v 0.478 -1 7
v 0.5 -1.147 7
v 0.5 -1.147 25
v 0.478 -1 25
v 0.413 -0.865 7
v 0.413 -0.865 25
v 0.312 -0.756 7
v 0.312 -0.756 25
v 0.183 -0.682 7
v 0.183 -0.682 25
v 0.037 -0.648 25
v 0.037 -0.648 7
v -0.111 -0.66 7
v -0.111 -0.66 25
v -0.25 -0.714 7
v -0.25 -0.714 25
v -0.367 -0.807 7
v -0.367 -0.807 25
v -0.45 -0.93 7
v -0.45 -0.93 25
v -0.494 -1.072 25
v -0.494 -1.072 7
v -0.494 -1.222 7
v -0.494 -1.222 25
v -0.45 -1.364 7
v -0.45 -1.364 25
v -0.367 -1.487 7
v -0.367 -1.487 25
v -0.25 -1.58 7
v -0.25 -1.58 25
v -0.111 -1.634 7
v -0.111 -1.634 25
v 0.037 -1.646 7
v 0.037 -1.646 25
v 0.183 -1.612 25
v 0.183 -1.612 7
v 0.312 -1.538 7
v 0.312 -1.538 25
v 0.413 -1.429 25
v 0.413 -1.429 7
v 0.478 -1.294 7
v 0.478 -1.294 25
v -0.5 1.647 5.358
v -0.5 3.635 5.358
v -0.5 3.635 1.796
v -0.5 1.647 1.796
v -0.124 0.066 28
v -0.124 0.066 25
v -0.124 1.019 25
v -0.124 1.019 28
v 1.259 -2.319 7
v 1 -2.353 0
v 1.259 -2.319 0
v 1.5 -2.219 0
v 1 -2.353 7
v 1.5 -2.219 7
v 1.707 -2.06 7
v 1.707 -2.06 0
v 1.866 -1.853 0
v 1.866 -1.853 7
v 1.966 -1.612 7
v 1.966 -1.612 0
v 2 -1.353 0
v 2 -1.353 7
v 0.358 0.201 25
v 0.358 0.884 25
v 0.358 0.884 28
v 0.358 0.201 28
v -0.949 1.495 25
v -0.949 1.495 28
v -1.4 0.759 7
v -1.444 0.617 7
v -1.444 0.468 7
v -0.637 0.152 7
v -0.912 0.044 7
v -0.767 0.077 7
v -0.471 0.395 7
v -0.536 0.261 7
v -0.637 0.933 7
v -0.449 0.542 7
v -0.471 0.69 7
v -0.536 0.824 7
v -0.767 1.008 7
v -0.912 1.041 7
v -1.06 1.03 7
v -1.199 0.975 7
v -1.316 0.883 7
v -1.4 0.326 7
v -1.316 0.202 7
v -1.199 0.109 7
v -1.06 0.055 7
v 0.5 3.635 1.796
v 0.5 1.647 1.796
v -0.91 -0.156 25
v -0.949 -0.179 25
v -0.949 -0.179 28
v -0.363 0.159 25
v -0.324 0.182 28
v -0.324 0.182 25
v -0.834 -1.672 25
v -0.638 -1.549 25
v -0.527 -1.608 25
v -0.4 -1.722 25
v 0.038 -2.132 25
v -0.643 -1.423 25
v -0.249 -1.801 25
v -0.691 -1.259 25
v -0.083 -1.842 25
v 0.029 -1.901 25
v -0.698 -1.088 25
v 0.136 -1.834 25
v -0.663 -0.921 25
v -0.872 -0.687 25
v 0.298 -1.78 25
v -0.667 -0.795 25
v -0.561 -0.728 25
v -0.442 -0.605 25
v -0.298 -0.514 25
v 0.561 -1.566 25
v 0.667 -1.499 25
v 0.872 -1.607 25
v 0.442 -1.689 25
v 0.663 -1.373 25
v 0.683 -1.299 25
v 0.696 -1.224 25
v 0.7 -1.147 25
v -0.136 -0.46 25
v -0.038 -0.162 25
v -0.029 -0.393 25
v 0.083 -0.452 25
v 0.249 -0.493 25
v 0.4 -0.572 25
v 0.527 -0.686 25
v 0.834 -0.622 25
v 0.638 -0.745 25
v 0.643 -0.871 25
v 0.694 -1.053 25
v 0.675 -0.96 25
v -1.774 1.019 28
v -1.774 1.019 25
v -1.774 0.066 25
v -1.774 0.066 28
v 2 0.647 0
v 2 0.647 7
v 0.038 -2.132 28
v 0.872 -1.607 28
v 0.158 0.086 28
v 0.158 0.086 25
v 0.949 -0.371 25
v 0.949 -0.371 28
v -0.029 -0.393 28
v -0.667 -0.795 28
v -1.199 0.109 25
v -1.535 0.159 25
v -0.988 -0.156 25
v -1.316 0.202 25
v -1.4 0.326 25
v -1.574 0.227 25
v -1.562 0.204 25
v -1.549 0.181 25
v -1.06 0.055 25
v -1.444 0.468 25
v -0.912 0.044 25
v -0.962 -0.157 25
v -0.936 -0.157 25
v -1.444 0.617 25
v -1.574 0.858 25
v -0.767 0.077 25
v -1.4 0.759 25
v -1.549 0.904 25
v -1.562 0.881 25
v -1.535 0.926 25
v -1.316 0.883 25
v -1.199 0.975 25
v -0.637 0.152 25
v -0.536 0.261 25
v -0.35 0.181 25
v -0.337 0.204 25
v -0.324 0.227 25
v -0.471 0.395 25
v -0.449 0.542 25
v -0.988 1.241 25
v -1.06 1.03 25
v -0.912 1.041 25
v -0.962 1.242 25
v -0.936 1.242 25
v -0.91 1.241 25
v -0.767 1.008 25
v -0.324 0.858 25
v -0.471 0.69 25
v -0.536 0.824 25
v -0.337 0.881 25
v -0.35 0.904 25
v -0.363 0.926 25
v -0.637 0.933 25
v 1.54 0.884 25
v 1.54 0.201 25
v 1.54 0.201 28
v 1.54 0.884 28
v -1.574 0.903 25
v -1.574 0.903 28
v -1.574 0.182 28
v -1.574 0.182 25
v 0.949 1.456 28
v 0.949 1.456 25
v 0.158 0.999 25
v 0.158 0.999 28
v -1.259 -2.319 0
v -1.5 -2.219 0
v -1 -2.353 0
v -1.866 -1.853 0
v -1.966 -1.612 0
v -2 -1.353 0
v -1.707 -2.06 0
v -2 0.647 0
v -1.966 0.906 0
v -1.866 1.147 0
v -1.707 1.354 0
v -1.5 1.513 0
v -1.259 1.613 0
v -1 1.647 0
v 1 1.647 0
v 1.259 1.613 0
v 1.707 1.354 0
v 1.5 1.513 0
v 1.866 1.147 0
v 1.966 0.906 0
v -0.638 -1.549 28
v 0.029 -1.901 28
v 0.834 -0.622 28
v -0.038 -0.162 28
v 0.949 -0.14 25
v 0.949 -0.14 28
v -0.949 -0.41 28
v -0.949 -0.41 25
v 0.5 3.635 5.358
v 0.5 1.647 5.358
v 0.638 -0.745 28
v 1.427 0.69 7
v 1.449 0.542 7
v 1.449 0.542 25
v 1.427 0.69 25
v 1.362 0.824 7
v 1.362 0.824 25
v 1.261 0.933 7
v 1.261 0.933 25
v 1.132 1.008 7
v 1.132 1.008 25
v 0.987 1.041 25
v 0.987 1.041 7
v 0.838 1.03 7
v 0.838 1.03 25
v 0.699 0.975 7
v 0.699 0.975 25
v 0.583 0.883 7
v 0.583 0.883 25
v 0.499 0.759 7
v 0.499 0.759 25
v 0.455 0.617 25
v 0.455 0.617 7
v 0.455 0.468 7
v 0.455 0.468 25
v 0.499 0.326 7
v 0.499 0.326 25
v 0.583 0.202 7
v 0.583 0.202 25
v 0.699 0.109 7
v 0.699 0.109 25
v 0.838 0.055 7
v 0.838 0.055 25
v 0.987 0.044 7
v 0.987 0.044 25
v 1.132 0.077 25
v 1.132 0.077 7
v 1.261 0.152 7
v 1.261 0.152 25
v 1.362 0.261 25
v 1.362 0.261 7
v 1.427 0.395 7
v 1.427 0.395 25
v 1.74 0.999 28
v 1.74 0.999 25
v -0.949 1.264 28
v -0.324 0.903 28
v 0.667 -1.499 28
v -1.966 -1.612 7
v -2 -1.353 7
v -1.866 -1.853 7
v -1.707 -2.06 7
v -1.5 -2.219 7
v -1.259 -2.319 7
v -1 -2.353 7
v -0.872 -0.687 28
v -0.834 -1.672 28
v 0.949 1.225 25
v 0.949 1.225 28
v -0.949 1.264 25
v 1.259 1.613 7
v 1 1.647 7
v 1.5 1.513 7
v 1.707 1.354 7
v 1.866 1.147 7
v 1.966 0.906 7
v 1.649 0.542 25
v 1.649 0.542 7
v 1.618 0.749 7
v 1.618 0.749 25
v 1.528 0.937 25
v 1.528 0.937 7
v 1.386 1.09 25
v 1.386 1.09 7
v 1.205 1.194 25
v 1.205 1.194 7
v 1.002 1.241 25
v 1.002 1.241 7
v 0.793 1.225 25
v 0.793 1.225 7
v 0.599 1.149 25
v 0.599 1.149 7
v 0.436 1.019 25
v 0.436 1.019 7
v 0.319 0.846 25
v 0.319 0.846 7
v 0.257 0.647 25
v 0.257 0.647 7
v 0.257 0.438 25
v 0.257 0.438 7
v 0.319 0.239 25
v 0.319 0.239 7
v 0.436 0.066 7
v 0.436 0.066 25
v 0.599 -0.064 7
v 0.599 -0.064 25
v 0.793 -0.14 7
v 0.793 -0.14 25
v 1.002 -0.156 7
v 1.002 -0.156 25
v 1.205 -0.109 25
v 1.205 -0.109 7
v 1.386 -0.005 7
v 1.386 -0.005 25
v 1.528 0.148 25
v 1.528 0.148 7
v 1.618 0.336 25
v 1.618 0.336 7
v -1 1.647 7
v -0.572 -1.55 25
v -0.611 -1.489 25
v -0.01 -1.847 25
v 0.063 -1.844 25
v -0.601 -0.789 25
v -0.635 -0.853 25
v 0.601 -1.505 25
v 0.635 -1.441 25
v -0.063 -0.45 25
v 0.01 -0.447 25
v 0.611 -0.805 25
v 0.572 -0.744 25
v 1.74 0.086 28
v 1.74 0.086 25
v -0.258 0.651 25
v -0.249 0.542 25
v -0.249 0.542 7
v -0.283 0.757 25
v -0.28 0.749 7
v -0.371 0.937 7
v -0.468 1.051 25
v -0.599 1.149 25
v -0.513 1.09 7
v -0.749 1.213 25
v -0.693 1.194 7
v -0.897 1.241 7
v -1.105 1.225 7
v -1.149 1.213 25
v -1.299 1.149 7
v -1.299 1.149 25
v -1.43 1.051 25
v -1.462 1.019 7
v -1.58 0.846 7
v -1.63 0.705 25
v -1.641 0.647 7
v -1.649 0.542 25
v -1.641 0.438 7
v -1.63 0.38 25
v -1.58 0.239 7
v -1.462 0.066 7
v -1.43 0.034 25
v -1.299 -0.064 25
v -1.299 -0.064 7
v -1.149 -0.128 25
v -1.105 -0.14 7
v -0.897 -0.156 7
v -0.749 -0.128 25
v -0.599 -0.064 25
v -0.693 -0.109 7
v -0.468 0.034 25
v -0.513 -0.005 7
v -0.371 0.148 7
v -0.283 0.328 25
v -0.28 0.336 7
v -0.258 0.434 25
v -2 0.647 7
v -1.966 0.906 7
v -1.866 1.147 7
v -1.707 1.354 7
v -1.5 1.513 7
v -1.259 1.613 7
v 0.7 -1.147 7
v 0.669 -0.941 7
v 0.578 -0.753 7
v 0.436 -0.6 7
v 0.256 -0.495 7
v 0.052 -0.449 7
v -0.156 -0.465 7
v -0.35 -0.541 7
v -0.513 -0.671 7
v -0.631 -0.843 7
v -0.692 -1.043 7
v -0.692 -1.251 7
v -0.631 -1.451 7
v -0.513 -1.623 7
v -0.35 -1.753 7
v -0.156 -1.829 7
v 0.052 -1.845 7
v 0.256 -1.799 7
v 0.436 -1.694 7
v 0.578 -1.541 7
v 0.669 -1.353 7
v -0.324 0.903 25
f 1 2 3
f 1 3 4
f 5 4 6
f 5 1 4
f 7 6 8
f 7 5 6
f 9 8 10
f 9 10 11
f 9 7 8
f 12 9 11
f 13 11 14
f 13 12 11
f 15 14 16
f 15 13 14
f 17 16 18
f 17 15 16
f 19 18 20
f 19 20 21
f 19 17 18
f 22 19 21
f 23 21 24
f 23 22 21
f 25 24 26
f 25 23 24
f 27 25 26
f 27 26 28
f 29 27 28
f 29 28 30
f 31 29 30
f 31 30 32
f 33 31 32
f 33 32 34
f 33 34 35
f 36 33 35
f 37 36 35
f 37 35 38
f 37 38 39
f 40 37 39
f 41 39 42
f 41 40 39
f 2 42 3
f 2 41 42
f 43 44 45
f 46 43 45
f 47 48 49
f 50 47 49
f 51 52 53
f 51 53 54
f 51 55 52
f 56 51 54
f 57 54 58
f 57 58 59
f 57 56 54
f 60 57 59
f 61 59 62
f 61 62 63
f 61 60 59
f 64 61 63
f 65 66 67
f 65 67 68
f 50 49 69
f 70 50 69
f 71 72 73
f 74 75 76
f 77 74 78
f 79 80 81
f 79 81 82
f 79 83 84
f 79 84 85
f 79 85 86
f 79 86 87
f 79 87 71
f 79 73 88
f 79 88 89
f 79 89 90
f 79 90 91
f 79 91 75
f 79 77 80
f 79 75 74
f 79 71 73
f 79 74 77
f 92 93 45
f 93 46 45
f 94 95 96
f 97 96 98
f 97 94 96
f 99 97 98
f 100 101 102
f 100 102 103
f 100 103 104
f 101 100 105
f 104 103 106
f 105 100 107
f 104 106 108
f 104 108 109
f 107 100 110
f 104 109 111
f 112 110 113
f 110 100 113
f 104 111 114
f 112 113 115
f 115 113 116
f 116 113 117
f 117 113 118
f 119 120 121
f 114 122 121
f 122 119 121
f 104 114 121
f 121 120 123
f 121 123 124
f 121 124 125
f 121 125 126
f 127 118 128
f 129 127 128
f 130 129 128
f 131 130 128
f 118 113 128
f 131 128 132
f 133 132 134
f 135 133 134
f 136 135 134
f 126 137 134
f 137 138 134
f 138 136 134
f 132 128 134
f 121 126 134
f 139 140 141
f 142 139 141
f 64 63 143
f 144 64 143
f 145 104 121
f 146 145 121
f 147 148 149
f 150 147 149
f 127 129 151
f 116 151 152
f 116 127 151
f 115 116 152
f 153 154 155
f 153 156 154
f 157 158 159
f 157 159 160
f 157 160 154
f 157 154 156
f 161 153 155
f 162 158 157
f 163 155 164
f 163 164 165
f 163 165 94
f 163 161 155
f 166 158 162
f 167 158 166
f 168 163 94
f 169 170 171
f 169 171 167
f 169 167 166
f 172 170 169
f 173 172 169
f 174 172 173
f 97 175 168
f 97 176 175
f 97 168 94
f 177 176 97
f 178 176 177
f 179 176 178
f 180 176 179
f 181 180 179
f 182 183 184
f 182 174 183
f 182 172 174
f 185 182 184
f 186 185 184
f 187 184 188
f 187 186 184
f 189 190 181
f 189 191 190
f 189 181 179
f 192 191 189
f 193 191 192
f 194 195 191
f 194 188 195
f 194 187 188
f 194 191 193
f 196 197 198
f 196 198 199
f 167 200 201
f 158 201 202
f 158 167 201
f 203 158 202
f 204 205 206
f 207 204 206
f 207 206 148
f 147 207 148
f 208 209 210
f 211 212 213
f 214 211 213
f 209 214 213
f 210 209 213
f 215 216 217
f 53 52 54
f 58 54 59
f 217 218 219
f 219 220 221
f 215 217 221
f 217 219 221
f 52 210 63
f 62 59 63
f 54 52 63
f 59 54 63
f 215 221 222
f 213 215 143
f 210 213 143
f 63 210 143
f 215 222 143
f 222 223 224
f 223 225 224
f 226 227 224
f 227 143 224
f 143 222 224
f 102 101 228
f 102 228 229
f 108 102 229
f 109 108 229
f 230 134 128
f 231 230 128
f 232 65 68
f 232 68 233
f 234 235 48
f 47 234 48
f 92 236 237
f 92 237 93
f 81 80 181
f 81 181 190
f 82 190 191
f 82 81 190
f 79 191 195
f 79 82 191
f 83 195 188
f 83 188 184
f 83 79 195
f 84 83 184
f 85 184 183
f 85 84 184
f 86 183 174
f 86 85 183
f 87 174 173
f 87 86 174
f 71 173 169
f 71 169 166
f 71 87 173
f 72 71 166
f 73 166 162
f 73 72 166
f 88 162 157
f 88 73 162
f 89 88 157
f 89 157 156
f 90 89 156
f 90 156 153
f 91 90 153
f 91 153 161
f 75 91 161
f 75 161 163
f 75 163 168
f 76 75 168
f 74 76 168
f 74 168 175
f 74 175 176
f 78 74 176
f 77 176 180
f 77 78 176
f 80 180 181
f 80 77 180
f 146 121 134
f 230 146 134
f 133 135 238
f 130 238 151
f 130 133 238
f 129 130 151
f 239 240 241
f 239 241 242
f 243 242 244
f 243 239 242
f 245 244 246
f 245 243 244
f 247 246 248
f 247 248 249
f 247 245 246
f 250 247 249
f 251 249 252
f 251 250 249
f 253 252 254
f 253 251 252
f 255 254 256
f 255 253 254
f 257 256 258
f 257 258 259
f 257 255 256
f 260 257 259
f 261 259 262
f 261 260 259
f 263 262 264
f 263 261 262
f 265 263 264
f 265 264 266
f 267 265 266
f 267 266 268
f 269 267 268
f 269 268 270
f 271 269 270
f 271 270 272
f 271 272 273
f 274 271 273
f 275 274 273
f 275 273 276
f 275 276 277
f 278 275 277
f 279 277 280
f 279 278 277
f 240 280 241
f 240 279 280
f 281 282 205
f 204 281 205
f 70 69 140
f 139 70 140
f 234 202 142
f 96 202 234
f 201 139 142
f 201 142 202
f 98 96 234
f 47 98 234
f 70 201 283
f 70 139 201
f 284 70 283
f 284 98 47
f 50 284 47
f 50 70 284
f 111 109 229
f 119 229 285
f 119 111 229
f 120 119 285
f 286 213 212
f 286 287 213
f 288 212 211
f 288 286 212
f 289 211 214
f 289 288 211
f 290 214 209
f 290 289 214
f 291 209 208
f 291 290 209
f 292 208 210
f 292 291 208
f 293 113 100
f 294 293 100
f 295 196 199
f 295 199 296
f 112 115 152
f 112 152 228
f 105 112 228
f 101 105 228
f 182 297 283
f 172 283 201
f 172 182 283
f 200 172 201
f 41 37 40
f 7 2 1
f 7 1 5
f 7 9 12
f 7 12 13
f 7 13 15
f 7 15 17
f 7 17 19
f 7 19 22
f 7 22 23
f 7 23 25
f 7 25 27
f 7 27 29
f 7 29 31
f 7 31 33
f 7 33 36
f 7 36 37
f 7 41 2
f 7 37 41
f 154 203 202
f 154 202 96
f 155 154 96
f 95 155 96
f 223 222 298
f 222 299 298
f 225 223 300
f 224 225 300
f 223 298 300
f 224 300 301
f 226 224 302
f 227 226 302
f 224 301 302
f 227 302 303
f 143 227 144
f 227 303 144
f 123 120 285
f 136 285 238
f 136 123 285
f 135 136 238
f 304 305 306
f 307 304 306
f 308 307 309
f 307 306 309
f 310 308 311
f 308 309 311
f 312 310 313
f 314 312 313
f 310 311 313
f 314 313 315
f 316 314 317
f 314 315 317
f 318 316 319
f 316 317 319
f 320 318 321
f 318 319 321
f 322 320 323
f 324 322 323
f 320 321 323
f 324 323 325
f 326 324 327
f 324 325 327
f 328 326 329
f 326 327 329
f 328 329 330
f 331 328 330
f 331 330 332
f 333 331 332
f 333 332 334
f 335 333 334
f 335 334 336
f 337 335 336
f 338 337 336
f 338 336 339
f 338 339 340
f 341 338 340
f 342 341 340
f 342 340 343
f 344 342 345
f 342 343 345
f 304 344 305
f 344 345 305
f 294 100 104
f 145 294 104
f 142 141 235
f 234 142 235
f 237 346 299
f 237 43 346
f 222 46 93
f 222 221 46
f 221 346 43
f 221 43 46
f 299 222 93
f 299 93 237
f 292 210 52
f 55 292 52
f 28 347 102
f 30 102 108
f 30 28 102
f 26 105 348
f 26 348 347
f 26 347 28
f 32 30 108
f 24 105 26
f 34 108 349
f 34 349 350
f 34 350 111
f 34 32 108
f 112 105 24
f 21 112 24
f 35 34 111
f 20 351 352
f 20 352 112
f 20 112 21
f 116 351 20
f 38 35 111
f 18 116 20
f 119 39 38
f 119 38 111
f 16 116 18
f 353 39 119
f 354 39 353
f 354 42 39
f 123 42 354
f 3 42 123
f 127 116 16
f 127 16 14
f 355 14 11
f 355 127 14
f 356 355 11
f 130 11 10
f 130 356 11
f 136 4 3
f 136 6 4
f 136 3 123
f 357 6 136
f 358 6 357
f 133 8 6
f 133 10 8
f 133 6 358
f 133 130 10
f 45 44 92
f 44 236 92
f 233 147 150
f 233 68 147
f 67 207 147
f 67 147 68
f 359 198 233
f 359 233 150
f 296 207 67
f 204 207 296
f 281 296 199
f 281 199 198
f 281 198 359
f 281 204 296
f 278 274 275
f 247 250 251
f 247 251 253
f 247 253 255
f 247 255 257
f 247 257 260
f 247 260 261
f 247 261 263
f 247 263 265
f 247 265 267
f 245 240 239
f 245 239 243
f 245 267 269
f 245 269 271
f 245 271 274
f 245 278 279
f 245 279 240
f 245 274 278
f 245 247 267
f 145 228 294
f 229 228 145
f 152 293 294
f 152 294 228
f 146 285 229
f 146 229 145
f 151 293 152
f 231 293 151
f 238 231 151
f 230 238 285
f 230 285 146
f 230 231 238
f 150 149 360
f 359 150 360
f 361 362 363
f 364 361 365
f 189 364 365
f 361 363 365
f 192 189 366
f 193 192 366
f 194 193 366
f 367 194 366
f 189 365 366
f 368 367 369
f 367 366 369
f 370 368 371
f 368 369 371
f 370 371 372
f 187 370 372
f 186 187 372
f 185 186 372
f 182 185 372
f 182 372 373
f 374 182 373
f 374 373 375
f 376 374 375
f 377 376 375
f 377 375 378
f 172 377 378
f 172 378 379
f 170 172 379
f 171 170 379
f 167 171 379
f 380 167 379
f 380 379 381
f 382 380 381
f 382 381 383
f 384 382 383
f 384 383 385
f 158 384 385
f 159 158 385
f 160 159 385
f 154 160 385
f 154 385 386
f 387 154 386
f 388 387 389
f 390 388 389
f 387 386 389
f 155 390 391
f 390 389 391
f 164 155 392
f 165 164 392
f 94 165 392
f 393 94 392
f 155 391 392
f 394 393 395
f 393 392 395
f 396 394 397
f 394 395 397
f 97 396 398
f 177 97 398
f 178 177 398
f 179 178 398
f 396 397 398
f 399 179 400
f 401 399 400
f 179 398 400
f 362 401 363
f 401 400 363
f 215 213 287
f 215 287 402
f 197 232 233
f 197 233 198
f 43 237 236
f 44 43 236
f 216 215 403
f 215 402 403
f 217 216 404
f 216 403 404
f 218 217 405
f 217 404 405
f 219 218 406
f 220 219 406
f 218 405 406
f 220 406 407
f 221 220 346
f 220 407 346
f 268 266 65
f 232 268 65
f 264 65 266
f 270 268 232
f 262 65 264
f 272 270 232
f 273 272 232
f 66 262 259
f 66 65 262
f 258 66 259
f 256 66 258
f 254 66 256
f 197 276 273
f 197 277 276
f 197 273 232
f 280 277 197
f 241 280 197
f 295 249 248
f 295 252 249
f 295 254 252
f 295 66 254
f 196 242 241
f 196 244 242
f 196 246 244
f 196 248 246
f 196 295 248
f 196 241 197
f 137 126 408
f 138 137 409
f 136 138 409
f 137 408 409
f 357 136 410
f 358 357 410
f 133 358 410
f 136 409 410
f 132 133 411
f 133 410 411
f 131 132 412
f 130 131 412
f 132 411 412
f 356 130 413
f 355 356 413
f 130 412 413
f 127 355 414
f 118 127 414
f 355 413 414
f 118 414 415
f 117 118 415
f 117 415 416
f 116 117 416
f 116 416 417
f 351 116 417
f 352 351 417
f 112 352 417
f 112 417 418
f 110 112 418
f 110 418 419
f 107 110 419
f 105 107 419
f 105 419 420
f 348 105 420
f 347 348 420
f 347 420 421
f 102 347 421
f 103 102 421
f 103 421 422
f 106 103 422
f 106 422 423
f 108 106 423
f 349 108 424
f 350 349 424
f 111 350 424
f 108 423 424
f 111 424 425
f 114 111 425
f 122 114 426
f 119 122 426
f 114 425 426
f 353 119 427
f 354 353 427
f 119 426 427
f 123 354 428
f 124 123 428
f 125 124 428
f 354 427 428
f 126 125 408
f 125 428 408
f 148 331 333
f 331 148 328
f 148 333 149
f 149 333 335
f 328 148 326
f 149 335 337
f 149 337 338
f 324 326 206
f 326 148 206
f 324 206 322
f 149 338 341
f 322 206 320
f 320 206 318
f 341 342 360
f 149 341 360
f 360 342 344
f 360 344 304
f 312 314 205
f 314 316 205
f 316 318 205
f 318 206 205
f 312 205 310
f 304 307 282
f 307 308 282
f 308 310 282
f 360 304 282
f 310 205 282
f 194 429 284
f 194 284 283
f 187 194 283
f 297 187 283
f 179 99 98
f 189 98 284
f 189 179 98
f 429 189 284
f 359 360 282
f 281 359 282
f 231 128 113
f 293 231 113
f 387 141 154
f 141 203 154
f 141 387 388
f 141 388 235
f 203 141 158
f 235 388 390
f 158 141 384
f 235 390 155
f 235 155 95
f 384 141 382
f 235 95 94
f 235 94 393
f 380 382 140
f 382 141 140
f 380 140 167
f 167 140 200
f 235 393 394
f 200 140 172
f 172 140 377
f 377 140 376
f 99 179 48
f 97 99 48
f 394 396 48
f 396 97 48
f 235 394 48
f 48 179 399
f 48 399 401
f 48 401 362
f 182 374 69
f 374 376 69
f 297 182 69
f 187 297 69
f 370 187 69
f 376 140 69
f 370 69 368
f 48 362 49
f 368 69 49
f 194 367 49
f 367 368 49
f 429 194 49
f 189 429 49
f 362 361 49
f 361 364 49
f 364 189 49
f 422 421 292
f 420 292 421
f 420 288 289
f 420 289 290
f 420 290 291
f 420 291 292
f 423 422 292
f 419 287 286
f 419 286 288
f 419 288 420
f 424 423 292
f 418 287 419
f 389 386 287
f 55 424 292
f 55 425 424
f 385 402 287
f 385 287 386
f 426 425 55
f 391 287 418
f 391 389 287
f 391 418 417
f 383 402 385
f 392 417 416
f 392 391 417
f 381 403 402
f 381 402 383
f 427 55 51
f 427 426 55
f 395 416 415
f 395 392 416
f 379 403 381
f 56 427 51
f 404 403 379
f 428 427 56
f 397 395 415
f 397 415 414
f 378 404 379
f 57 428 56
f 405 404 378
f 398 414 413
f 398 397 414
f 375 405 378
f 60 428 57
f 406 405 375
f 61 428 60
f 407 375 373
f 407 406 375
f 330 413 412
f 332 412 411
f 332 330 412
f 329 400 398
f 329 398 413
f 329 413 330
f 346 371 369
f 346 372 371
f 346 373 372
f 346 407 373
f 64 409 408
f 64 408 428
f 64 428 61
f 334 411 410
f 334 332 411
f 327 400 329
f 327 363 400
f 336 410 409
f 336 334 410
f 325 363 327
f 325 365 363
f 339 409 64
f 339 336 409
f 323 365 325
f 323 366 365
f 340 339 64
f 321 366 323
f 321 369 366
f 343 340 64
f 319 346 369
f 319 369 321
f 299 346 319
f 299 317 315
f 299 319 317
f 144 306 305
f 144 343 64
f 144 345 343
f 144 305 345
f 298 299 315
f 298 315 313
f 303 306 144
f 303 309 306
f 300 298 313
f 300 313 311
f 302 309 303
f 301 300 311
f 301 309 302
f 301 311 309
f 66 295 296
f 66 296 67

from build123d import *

# Parameters (mm, degrees)
IZIM1_W                          = 4
IZIM1_H                          = 4
Y_KSEKLIK_EKSTR_ZYON1_DEPTH      = 7
RADYUS1_R                        = 1
RADYUS2_R                        = 1
RADYUS3_R                        = 1
RADYUS4_R                        = 1
IZIM3_R                          = 0.7
IZIM3_R_2                        = 0.5
EKSTR_ZYON_NCE1_DEPTH            = 18
IZIM6_W                          = 3.561558411
IZIM6_H                          = 1.988004136
Y_KSEKLIK_EKSTR_ZYON2_DEPTH      = 0.5
Y_KSEKLIK_EKSTR_ZYON2_DEPTH_BACK = 0.5
EKSTR_ZYON_NCE3_DEPTH            = 3


with BuildPart() as part:
    # Çizim1 → Yükseklik-Ekstrüzyon1 (new body)
    with BuildSketch(Plane.XY):
        with Locations((0, -0.353018955)):
            Rectangle(IZIM1_W, IZIM1_H)
    extrude(amount=Y_KSEKLIK_EKSTR_ZYON1_DEPTH)

    # Radyus1
    radyus1_edges = [part.edges().sort_by_distance(p)[0] for p in [
        (2, -2.353018955, 3.5),
    ]]
    fillet(radyus1_edges, radius=RADYUS1_R)

    # Radyus2
    radyus2_edges = [part.edges().sort_by_distance(p)[0] for p in [
        (-2, 1.646981045, 3.5),
    ]]
    fillet(radyus2_edges, radius=RADYUS2_R)

    # Radyus3
    radyus3_edges = [part.edges().sort_by_distance(p)[0] for p in [
        (2, 1.646981045, 3.5),
    ]]
    fillet(radyus3_edges, radius=RADYUS3_R)

    # Radyus4
    radyus4_edges = [part.edges().sort_by_distance(p)[0] for p in [
        (-2, -2.353018955, 3.5),
    ]]
    fillet(radyus4_edges, radius=RADYUS4_R)

    # Çizim3 → Ekstrüzyon-İnce1 (add)
    with BuildSketch(Plane.XY.offset(7)):
        with Locations((-0.949214627, 0.542466542)):
            Circle(IZIM3_R)
        with Locations((-0.949214627, 0.542466542)):
            Circle(IZIM3_R_2, mode=Mode.SUBTRACT)
        with Locations((0.949214627, 0.542466542)):
            Circle(IZIM3_R)
        with Locations((0.949214627, 0.542466542)):
            Circle(IZIM3_R_2, mode=Mode.SUBTRACT)
        with Locations((0, -1.147016096)):
            Circle(IZIM3_R)
        with Locations((0, -1.147016096)):
            Circle(IZIM3_R_2, mode=Mode.SUBTRACT)
    extrude(amount=EKSTR_ZYON_NCE1_DEPTH)

    # Çizim6 → Yükseklik-Ekstrüzyon2 (add, two sides)
    with BuildSketch(Plane(origin=(0, 0, 0), x_dir=(0, 0, -1), z_dir=(1, 0, 0))) as y_kseklik_ekstr_zyon2_sk:
        with Locations((-3.576903913, 2.640983113)):
            Rectangle(IZIM6_W, IZIM6_H)
    extrude(amount=Y_KSEKLIK_EKSTR_ZYON2_DEPTH)
    extrude(y_kseklik_ekstr_zyon2_sk.sketch, amount=-Y_KSEKLIK_EKSTR_ZYON2_DEPTH_BACK)

    # Çizim4 → Ekstrüzyon-İnce3 (add)
    with BuildSketch(Plane.XY.offset(25)):
        Polygon((-0.949214627, -0.409912915), (-0.124429823, 0.066276814), (-0.124429823, 1.018656271), (-0.949214627, 1.494845999), (-1.773999431, 1.018656271), (-1.773999431, 0.066276814), align=None)
        Polygon((-0.949214627, -0.178972807), (-0.324429823, 0.181746867), (-0.324429823, 0.903186217), (-0.949214627, 1.263905891), (-1.573999431, 0.903186217), (-1.573999431, 0.181746867), align=None, mode=Mode.SUBTRACT)
        Polygon((0.949214627, -0.371158962), (1.740437522, 0.08565379), (1.740437522, 0.999279294), (0.949214627, 1.456092046), (0.157991731, 0.999279294), (0.157991731, 0.08565379), align=None)
        Polygon((0.949214627, -0.140218854), (1.540437522, 0.201123844), (1.540437522, 0.88380924), (0.949214627, 1.225151938), (0.357991731, 0.88380924), (0.357991731, 0.201123844), align=None, mode=Mode.SUBTRACT)
        Polygon((0.871605884, -1.606698651), (0.833899712, -0.622024536), (-0.037706171, -0.162341981), (-0.871605884, -0.687333541), (-0.833899712, -1.672007655), (0.037706171, -2.131690211), align=None)
        Polygon((0.667333897, -1.498966164), (0.638464649, -0.745063023), (-0.028869248, -0.393112954), (-0.667333897, -0.795066027), (-0.638464649, -1.548969169), (0.028869248, -1.900919237), align=None, mode=Mode.SUBTRACT)
    extrude(amount=EKSTR_ZYON_NCE3_DEPTH)


solid = part.part
